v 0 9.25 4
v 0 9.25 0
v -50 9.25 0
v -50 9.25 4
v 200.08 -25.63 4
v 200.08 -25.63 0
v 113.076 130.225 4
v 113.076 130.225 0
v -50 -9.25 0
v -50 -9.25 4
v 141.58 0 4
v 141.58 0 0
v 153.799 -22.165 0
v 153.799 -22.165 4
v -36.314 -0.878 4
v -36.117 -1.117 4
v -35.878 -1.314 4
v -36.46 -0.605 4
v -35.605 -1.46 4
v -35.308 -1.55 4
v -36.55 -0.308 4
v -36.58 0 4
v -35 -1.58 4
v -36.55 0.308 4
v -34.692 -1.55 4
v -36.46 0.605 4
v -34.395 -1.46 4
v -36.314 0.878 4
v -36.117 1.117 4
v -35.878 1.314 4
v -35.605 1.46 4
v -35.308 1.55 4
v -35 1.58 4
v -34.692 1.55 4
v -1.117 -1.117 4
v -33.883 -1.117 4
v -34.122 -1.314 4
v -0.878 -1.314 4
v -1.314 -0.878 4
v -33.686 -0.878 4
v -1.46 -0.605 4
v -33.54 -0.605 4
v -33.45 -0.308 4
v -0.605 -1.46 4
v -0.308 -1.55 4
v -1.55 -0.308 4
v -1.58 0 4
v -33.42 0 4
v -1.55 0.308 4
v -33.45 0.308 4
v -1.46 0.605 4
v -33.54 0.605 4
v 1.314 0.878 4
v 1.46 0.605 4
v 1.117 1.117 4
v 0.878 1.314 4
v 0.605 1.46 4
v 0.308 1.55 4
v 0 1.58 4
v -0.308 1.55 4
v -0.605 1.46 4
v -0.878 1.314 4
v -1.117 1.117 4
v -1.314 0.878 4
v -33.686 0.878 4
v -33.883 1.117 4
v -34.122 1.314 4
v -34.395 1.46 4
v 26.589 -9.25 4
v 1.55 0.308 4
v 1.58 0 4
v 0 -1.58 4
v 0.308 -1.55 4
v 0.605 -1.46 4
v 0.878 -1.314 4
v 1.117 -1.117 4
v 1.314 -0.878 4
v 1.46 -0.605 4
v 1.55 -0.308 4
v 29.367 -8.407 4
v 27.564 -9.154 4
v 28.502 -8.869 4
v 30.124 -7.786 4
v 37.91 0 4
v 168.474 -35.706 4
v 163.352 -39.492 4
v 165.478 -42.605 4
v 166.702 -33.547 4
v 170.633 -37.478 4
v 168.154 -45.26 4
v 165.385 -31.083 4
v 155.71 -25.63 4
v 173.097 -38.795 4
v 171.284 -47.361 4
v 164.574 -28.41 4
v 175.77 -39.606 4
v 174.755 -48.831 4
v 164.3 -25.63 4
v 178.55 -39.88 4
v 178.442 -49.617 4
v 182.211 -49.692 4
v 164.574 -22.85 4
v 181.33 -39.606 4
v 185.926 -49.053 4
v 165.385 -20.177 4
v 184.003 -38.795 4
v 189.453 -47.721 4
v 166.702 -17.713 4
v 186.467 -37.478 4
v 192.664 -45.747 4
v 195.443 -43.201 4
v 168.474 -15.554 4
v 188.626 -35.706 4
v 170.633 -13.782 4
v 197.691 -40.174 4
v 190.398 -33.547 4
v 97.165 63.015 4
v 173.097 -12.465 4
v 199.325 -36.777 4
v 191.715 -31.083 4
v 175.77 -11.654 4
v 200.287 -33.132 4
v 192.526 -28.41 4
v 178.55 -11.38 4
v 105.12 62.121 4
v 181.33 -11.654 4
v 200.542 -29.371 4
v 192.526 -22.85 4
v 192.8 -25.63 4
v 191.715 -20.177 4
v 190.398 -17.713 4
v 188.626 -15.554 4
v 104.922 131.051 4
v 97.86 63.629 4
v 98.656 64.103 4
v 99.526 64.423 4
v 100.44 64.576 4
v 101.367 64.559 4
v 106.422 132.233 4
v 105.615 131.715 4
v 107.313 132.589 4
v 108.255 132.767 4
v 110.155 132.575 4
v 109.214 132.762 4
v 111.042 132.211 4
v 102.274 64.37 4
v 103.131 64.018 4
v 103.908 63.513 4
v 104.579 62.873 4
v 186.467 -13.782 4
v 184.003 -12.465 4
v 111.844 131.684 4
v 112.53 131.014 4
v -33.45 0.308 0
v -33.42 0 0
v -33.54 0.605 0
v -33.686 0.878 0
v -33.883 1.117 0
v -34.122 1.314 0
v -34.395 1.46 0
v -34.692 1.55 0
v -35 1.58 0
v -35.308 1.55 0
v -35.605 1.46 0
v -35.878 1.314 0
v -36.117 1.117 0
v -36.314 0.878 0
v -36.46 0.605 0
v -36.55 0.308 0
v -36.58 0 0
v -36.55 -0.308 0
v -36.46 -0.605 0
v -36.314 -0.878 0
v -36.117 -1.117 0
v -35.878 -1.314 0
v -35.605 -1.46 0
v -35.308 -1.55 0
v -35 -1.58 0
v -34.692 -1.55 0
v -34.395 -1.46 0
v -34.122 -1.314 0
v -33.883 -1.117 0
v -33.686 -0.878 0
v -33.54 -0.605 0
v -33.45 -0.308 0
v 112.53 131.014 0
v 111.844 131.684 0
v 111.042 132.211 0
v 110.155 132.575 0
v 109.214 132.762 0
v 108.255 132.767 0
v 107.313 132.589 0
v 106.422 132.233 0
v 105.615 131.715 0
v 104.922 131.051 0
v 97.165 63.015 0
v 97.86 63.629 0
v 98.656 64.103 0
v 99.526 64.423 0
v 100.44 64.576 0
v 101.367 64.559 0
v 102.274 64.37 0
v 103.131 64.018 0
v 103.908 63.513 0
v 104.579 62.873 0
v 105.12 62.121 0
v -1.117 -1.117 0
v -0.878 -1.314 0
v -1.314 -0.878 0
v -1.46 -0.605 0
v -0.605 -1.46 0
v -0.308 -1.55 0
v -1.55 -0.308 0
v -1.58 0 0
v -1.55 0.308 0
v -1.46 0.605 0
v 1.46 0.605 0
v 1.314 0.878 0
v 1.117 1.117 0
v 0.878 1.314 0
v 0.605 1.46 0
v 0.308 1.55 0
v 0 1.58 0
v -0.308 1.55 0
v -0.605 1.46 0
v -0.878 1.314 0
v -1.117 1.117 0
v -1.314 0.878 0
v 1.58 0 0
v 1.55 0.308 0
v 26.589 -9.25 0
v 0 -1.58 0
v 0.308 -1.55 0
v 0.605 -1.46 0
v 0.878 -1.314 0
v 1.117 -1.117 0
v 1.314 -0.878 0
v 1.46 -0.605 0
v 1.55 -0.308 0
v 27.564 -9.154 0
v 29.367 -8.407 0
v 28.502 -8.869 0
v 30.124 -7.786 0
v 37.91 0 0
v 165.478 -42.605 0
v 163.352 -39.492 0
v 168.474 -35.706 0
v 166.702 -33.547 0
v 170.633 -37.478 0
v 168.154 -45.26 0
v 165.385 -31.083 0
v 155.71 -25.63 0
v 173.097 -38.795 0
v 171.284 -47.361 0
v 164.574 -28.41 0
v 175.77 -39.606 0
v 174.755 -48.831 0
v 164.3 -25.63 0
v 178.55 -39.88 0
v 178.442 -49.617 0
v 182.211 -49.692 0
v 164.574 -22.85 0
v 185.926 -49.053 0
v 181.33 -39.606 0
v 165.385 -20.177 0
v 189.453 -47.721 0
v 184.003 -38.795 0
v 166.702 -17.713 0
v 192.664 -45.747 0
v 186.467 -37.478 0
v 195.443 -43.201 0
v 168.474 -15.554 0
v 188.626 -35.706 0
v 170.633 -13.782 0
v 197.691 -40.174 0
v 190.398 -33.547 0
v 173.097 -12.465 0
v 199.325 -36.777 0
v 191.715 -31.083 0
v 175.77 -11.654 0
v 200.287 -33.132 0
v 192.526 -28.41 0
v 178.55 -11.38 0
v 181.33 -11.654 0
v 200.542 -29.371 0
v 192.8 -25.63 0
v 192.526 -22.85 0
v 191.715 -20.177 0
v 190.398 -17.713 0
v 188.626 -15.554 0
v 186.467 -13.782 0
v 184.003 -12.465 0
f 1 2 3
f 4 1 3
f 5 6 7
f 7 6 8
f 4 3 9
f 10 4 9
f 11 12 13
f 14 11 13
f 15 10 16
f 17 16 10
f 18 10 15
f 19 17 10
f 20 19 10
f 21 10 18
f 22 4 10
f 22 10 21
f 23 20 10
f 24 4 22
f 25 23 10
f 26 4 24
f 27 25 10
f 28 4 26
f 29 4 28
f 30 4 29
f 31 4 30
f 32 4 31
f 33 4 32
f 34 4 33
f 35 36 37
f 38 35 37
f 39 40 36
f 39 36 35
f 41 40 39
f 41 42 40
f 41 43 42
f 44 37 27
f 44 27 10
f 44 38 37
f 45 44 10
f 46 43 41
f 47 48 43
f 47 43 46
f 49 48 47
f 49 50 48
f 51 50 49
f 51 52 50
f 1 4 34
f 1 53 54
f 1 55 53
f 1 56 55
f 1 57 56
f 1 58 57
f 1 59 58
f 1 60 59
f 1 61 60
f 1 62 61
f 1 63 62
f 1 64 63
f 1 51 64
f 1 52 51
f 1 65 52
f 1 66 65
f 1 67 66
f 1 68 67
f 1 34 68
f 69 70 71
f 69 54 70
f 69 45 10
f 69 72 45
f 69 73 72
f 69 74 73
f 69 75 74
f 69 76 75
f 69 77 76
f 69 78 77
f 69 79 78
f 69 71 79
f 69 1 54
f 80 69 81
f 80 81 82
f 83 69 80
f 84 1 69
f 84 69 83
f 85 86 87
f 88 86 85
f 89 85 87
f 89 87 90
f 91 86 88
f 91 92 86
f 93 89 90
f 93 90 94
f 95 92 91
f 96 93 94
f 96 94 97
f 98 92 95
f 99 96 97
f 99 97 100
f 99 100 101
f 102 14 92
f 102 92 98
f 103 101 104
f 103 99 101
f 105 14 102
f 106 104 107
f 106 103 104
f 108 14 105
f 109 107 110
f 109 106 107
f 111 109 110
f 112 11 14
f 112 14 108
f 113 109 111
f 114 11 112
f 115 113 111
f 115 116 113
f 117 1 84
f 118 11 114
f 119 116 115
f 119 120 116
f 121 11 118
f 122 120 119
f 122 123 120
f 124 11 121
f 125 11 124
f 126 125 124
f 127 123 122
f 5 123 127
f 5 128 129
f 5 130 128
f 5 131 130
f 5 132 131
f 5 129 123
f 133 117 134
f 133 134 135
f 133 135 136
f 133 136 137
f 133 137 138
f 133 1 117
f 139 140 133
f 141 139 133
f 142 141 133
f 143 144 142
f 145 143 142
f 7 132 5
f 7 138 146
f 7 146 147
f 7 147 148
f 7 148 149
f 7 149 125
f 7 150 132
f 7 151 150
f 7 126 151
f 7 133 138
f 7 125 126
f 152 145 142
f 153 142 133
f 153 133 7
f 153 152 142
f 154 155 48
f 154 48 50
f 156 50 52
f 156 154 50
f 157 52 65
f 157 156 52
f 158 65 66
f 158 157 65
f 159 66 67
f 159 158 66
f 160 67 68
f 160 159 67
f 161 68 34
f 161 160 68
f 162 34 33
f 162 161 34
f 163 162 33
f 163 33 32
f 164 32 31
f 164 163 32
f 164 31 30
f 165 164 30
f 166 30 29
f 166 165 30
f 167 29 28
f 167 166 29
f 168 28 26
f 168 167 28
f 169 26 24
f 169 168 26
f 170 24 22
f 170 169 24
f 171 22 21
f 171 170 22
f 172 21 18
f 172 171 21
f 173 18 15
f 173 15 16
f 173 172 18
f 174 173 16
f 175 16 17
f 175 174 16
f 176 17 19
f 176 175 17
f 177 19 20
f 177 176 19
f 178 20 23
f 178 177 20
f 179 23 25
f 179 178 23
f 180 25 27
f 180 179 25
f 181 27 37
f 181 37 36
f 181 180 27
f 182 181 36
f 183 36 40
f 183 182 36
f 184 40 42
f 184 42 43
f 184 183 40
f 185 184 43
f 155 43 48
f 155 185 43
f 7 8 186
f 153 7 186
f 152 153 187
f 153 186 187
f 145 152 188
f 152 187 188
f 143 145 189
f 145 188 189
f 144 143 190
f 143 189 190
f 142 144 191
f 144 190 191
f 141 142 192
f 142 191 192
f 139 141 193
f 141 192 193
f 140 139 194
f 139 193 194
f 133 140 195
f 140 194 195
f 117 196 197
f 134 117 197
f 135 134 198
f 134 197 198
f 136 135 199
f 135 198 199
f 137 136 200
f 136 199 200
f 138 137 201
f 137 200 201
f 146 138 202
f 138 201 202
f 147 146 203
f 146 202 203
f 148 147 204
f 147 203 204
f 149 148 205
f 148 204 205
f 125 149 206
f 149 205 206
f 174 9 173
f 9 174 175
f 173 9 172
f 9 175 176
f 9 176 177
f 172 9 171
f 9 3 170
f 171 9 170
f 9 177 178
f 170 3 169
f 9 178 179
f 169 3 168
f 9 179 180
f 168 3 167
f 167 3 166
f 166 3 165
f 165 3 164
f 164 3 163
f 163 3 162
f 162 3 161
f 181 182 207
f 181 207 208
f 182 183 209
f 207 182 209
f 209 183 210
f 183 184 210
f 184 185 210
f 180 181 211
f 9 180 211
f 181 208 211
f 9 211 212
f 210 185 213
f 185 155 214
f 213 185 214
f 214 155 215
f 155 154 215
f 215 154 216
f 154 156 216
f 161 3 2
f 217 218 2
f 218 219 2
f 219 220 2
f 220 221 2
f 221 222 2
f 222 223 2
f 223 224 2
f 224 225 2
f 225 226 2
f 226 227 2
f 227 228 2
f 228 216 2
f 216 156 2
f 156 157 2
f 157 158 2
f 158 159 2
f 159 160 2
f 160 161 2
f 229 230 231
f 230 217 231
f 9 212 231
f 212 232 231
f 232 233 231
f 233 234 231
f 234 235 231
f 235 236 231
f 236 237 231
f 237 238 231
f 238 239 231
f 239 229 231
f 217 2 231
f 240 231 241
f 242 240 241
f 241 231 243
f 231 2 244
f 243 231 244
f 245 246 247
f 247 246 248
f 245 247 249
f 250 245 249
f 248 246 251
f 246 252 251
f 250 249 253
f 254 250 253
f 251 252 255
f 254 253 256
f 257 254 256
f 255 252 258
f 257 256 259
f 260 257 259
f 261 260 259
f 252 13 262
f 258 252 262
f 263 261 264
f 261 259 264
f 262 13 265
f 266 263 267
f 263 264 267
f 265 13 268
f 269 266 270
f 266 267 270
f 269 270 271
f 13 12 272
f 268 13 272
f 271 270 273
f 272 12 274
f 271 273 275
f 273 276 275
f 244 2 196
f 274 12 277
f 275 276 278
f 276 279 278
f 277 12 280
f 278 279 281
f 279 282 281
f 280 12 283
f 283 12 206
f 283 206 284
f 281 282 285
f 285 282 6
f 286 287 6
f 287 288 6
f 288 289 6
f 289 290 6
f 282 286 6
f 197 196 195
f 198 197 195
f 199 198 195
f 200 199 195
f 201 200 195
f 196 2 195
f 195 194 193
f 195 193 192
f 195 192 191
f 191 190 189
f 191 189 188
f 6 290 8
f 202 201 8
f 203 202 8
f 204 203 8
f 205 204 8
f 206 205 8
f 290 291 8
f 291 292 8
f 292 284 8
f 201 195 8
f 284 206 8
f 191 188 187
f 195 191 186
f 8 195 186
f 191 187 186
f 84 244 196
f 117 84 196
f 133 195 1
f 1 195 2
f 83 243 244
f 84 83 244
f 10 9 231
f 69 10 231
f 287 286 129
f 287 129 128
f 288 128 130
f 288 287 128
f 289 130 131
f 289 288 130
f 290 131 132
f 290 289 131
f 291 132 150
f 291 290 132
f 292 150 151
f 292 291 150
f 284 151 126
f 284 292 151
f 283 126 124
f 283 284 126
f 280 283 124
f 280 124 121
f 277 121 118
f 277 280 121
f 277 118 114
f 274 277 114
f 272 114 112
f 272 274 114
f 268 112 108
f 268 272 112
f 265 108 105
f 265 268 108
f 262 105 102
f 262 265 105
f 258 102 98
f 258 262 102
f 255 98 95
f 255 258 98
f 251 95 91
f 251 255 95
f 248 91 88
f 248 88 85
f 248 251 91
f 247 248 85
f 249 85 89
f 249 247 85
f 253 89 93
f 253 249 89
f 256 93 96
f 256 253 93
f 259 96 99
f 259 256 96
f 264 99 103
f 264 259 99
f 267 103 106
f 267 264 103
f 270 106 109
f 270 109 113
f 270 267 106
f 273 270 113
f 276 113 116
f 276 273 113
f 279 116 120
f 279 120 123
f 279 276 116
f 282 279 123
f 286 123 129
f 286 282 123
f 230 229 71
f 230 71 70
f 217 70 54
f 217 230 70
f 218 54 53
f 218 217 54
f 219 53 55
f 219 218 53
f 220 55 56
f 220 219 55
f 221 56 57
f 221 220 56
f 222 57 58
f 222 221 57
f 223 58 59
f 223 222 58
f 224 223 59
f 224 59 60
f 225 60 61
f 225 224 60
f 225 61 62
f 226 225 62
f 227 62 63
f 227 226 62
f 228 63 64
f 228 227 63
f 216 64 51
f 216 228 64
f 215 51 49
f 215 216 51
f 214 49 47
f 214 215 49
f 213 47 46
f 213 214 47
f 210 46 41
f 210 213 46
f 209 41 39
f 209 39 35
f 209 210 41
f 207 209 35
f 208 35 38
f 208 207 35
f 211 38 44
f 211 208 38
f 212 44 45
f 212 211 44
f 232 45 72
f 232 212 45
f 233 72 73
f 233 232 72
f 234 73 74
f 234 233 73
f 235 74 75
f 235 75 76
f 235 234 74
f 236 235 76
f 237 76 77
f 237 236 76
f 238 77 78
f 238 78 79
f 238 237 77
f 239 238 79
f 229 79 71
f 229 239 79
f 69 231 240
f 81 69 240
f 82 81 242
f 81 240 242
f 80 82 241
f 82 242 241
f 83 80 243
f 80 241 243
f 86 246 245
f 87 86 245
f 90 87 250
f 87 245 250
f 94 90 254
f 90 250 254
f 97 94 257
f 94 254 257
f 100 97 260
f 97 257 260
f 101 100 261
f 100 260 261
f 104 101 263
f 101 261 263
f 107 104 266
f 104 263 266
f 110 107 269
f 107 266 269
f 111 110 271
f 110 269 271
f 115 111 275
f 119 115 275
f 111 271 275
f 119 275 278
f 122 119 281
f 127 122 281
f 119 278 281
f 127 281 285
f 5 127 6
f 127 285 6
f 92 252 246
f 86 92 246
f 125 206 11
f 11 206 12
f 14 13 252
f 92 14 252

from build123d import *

# Parameters (mm, degrees)
CROQUIS1_R              = 1.58
CROQUIS1_R_2            = 14.25
SALIENTE_EXTRUIR1_DEPTH = 4


with BuildPart() as part:
    # Croquis1 → Saliente-Extruir1 (new body)
    with BuildSketch(Plane.XY):
        with BuildLine():
            Line((30.124466094, -7.785533906), (37.91, 0))
            Line((37.91, 0), (97.165453192, 63.015199165))
            ThreePointArc((97.165453192, 63.015199165), (101.36659613, 64.558696549), (105.120132173, 62.12087922))
            Line((105.120132173, 62.12087922), (141.58, 0))
            Line((141.58, 0), (153.799494633, -22.164589344))
            Line((153.799494633, -22.164589344), (155.71, -25.63))
            Line((155.71, -25.63), (163.352260057, -39.49207539))
            ThreePointArc((163.352260057, -39.49207539), (187.721004887, -48.471027794), (200.08, -25.63))
            Line((200.08, -25.63), (113.076169939, 130.225021029))
            ThreePointArc((113.076169939, 130.225021029), (109.214360618, 132.762403753), (104.922096847, 131.051160333))
            Line((104.922096847, 131.051160333), (0, 9.25))
            Line((0, 9.25), (-35, 9.25))
            Line((-35, 9.25), (-50, 9.25))
            Line((-50, 9.25), (-50, -9.25))
            Line((-50, -9.25), (-35, -9.25))
            Line((-35, -9.25), (0, -9.25))
            Line((0, -9.25), (26.588932188, -9.25))
            ThreePointArc((26.588932188, -9.25), (28.50234935, -8.869397663), (30.124466094, -7.785533906))
        make_face()
        with Locations((-35, 0)):
            Circle(CROQUIS1_R, mode=Mode.SUBTRACT)
        Circle(CROQUIS1_R, mode=Mode.SUBTRACT)
        with Locations((178.55, -25.63)):
            Circle(CROQUIS1_R_2, mode=Mode.SUBTRACT)
    extrude(amount=SALIENTE_EXTRUIR1_DEPTH)


solid = part.part
